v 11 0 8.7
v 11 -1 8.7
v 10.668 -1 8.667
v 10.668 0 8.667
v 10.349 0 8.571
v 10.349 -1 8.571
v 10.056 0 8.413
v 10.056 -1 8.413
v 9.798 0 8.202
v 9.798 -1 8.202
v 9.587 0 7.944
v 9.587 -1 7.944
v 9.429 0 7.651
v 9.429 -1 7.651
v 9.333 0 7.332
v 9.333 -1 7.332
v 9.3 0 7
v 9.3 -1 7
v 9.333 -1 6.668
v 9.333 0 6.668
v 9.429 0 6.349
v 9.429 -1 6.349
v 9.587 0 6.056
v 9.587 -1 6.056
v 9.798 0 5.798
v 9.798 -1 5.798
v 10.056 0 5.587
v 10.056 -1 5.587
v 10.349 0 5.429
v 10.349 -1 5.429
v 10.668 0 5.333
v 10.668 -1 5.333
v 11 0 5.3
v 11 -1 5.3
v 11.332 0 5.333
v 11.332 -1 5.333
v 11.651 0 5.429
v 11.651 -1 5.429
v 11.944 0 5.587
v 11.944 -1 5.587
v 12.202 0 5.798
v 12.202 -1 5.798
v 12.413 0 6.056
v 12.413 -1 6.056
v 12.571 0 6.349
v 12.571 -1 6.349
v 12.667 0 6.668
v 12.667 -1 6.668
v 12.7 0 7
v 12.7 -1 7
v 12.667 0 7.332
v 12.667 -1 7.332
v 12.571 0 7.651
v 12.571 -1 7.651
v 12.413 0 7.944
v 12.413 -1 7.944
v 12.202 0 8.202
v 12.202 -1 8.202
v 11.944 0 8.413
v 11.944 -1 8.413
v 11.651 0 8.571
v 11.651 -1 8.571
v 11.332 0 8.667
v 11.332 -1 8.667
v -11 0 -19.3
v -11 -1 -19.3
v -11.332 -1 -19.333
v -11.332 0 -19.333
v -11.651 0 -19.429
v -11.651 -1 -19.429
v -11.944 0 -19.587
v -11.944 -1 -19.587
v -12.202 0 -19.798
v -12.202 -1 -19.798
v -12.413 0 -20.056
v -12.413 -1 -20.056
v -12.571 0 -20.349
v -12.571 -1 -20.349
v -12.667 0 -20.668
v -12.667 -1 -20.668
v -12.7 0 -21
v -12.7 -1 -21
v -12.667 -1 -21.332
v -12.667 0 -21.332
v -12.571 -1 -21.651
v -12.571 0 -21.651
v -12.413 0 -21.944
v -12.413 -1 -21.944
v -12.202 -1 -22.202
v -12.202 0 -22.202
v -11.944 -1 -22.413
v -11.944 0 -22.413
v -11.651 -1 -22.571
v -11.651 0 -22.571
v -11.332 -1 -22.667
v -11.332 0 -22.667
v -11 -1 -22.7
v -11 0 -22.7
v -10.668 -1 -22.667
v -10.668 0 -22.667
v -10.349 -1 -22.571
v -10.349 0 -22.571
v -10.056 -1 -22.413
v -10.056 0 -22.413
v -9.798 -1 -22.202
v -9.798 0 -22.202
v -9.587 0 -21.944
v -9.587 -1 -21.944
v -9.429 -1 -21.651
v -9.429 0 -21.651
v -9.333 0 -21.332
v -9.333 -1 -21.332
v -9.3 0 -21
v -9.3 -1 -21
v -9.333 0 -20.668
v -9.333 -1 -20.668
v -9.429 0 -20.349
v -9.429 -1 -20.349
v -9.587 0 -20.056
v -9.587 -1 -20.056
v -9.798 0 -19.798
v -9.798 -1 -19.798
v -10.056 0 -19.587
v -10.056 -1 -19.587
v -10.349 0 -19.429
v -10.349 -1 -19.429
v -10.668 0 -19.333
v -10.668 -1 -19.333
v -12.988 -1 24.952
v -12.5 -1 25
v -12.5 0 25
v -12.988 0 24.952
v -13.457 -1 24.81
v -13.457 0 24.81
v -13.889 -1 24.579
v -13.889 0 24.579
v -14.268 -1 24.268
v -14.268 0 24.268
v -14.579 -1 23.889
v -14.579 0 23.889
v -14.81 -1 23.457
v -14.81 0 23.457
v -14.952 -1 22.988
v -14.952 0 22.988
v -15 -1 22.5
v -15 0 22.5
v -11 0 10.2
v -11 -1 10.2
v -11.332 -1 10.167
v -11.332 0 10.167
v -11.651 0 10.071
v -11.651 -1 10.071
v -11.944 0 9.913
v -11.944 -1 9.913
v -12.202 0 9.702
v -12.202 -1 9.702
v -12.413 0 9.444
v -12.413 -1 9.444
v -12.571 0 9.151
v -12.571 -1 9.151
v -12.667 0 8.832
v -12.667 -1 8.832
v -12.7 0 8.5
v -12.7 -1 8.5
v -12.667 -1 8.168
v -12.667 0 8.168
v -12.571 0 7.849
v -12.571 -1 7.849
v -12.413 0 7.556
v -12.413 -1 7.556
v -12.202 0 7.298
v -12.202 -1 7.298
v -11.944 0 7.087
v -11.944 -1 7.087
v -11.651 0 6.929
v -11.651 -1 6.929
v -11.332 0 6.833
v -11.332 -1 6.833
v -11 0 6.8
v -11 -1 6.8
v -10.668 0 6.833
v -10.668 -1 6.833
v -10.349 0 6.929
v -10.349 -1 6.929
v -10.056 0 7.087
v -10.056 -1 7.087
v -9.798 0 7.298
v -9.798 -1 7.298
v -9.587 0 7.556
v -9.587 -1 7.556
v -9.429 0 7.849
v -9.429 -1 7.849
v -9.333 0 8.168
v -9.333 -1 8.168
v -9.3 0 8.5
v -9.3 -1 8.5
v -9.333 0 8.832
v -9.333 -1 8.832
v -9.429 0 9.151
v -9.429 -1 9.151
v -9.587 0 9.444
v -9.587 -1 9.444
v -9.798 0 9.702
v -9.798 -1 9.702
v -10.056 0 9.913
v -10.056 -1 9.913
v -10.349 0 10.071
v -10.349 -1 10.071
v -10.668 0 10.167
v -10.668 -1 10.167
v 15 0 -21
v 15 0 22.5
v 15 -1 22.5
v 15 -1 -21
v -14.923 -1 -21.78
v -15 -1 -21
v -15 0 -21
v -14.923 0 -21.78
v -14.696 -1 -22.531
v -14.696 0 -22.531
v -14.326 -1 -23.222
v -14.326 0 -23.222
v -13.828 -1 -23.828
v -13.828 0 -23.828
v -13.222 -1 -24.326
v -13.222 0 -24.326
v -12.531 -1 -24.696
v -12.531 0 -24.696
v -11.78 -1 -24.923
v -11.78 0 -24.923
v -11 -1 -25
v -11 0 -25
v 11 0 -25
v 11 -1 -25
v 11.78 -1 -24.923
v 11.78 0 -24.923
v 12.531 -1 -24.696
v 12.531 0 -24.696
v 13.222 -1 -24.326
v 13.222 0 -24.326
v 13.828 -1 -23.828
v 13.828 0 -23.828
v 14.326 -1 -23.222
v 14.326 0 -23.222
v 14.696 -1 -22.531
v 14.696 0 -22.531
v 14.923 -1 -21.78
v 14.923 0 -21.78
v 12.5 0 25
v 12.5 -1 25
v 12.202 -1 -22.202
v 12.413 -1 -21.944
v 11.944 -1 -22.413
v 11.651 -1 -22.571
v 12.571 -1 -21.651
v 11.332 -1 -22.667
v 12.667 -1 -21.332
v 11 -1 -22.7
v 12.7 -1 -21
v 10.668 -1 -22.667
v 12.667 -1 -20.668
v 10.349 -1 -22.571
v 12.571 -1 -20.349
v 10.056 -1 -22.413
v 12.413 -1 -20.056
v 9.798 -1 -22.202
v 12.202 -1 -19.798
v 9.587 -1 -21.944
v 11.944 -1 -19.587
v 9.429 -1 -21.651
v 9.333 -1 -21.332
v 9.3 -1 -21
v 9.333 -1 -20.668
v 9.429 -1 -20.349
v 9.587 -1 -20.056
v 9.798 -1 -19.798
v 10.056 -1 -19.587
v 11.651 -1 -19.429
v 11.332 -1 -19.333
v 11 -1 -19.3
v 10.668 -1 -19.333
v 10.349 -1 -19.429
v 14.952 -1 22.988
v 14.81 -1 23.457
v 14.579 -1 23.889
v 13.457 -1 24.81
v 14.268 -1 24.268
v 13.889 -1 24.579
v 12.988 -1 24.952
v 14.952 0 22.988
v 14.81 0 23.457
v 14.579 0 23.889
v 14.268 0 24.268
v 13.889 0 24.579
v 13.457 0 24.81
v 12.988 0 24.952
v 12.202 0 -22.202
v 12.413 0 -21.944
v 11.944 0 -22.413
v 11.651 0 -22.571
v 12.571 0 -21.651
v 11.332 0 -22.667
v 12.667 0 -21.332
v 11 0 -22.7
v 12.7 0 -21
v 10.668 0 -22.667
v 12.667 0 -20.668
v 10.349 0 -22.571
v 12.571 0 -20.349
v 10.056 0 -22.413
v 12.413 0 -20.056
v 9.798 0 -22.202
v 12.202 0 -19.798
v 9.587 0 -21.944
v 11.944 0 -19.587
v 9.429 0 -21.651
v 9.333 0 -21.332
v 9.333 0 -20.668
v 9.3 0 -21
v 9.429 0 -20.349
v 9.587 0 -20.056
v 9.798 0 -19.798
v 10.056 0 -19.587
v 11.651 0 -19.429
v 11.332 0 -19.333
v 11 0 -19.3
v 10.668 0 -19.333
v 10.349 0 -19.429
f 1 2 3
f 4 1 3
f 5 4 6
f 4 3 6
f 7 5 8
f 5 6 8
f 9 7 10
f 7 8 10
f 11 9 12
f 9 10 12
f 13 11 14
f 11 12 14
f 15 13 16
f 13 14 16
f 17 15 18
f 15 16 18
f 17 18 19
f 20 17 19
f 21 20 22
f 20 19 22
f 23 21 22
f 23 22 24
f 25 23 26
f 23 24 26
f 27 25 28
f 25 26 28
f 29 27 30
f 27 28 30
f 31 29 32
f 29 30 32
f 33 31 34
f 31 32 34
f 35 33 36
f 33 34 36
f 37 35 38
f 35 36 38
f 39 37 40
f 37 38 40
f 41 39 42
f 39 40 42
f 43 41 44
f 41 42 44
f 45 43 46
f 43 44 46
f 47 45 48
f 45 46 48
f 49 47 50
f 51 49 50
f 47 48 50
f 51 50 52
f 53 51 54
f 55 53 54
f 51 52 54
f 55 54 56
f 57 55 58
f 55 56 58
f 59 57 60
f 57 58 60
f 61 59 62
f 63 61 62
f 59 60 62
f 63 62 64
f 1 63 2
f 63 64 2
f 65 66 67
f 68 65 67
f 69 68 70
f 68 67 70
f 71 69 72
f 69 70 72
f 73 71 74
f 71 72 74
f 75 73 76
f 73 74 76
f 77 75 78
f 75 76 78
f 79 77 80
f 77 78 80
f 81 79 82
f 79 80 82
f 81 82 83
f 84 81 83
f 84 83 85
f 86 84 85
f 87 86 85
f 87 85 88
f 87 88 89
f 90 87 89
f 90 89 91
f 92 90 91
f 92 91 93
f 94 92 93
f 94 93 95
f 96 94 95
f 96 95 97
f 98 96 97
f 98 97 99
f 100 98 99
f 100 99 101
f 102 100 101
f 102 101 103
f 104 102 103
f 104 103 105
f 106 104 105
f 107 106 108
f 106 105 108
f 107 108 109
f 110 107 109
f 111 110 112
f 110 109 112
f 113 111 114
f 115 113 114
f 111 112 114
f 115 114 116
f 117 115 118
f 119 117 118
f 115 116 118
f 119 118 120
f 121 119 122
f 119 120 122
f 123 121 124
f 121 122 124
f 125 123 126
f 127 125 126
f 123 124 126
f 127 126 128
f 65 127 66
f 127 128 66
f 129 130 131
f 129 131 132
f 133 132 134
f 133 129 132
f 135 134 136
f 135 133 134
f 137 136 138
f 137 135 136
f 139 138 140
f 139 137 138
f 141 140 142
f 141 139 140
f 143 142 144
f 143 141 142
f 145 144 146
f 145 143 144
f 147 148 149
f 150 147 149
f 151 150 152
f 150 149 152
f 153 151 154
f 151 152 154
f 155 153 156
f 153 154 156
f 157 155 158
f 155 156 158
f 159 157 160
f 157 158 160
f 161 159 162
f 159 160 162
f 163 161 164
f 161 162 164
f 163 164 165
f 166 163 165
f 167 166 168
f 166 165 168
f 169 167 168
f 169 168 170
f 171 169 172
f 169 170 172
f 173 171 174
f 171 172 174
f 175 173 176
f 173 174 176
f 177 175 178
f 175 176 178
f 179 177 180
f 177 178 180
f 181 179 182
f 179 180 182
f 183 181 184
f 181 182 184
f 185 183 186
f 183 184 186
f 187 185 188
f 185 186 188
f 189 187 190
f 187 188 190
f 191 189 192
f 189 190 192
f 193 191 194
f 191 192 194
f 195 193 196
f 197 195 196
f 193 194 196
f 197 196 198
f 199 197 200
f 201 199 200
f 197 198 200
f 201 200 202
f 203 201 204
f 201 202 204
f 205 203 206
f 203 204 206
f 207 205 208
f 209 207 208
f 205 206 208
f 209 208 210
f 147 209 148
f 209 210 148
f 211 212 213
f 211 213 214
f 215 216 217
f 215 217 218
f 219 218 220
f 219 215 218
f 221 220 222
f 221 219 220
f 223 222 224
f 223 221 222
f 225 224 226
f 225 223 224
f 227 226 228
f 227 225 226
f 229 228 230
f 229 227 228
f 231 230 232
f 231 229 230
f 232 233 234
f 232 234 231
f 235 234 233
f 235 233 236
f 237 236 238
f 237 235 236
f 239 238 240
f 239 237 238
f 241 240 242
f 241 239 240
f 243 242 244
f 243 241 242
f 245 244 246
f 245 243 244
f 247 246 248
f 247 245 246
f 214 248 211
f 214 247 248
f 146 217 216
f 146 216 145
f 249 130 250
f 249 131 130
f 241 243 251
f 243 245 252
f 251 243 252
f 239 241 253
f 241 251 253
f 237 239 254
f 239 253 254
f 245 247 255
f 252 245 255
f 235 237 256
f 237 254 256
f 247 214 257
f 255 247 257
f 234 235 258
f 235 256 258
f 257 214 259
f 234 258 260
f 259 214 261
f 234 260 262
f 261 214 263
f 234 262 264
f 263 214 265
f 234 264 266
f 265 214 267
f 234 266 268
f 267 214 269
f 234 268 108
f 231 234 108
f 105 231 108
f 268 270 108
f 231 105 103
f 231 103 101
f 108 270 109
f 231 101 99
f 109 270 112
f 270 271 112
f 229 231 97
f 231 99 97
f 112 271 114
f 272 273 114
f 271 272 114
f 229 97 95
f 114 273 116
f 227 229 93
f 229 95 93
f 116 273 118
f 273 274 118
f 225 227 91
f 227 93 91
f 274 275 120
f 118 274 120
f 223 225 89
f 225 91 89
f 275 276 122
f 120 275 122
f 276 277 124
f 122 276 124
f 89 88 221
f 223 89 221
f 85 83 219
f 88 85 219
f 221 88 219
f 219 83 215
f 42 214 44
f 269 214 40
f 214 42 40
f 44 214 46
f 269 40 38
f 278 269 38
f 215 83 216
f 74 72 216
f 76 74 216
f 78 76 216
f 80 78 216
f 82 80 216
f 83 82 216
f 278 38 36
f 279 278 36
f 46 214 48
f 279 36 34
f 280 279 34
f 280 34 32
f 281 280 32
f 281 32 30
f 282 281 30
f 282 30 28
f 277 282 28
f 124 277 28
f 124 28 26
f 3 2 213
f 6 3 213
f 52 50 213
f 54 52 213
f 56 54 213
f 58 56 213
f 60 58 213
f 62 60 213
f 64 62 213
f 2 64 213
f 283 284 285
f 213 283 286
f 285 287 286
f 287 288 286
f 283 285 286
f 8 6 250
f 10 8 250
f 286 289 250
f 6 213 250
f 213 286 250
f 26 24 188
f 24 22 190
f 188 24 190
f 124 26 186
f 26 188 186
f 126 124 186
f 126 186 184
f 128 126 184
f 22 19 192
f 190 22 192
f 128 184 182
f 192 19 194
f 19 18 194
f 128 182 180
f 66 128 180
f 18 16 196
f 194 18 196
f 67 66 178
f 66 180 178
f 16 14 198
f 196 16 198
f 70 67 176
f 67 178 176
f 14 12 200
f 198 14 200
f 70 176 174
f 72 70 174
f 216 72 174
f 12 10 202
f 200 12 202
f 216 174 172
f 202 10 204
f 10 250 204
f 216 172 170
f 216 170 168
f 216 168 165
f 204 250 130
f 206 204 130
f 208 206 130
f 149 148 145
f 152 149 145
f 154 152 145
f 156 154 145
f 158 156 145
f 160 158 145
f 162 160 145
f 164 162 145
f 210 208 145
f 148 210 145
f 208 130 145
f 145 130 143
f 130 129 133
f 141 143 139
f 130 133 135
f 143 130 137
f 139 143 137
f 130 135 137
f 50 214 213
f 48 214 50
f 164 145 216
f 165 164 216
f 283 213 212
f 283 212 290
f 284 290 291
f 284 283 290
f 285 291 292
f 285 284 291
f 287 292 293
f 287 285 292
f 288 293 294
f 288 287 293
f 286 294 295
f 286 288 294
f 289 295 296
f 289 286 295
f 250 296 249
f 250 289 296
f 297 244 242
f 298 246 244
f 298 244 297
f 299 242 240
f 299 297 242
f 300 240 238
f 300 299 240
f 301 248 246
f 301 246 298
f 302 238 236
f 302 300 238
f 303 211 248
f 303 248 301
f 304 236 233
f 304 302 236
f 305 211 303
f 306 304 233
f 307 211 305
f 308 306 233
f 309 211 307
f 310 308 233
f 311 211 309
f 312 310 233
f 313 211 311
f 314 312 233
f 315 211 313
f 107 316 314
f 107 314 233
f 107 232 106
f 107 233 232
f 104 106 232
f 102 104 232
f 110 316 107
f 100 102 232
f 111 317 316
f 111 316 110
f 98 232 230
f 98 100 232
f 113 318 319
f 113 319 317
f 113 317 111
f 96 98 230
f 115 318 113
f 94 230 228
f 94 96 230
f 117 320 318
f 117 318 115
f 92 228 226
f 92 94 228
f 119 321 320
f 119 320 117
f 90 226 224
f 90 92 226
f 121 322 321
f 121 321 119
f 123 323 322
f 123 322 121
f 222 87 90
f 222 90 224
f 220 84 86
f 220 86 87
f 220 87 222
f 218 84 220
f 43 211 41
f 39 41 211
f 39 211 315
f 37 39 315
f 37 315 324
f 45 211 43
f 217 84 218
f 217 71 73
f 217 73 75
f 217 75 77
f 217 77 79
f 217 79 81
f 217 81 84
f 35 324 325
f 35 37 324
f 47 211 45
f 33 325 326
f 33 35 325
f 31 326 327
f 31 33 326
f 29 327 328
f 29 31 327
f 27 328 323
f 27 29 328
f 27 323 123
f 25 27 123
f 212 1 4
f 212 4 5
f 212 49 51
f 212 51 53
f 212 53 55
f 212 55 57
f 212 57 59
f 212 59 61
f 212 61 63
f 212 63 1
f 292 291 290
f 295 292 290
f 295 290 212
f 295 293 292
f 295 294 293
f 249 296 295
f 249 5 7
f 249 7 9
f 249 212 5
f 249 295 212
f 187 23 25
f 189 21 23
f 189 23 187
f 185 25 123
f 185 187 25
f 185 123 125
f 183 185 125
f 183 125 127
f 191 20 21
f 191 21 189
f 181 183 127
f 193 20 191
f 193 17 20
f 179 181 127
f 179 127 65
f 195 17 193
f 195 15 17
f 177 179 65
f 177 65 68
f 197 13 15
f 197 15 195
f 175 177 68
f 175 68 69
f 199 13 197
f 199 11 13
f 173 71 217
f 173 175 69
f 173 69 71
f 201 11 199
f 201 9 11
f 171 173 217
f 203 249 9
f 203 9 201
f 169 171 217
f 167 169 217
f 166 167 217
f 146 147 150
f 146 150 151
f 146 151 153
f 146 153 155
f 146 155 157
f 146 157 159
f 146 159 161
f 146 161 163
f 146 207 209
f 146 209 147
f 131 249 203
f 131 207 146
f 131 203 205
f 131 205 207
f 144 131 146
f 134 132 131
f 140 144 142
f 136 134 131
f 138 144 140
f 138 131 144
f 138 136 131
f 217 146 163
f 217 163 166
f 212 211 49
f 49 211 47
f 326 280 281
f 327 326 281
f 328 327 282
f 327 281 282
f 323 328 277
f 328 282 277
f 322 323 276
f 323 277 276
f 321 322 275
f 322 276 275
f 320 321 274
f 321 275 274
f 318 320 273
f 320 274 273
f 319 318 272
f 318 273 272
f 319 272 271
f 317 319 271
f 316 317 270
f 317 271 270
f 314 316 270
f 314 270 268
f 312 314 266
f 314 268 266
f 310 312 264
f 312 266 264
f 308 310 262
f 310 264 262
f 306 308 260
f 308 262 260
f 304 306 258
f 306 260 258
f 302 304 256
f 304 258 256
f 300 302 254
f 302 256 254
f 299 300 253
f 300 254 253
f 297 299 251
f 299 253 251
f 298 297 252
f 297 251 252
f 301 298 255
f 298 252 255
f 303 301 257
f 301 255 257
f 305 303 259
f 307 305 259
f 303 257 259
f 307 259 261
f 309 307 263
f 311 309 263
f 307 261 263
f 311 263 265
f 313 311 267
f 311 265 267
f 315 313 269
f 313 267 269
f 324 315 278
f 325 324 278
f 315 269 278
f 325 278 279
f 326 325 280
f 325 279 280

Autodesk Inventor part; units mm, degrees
ref_plane "YZ Plane" through (0, 0, 0) normal (1, 0, 0) x (0, 1, 0)
ref_plane "XZ Plane" through (0, 0, 0) normal (0, 1, 0) x (-1, 0, 0)
ref_plane "XY Plane" through (0, 0, 0) normal (0, 0, 1) x (1, 0, 0)
sketch "Sketch1" plane through (0, 0, 0) normal (0, 1, 0) x (-1, 0, 0)
  line L0 (15, 25) -> (-15, 25)
  line L1 (-15, 25) -> (-15, -25)
  line L2 (-15, -25) -> (15, -25)
  line L3 (15, -25) -> (15, 25)
  line L4 (21, 0) -> (-21, 0) construction
  line L5 (0, -35) -> (0, 35) construction
  point P0 (0, 0)
  dimension "d11" = 15
  dimension "d12" = 15
  dimension "d13" = 25
  dimension "d14" = 25
extrude "Extrusion1" add sketch "Sketch1" against normal blind 1
fillet "Fillet1" radius 2.5 2 edges at (-15, -0.5, 25) (15, -0.5, 25)
fillet "Fillet2" radius 4 2 edges at (-15, -0.5, -25) (15, -0.5, -25)
sketch "Sketch3" plane through (0, 0, 0) normal (0, 1, 0) x (1, 0, 0)
  arc A0 (15, 21) -> (11, 25) centre (11, 21) ccw projected
  arc A1 (-11, 25) -> (-15, 21) centre (-11, 21) ccw projected
  line L0 (15, -22.5) -> (15, 21) projected
  line L1 (-15, 21) -> (-15, -22.5) projected
  line L2 (-12.5, -25) -> (12.5, -25) projected
  point P0 (0, 0)
  point P1 (11, -7)
  point P2 (-11, -8.5)
  point P3 (12.5, -25)
  dimension "d24" = 4
  dimension "d25" = 4
  dimension "d52" = 18
  dimension "d53" = 1.5
hole "Hole2" at (-11, 0, -21) at (11, 0, -21) at (11, 0, 7) at (-11, 0, 8.5) direction (0, -1, 0) diameter 3.4 end through all
properties part number "mcu_pcb"
